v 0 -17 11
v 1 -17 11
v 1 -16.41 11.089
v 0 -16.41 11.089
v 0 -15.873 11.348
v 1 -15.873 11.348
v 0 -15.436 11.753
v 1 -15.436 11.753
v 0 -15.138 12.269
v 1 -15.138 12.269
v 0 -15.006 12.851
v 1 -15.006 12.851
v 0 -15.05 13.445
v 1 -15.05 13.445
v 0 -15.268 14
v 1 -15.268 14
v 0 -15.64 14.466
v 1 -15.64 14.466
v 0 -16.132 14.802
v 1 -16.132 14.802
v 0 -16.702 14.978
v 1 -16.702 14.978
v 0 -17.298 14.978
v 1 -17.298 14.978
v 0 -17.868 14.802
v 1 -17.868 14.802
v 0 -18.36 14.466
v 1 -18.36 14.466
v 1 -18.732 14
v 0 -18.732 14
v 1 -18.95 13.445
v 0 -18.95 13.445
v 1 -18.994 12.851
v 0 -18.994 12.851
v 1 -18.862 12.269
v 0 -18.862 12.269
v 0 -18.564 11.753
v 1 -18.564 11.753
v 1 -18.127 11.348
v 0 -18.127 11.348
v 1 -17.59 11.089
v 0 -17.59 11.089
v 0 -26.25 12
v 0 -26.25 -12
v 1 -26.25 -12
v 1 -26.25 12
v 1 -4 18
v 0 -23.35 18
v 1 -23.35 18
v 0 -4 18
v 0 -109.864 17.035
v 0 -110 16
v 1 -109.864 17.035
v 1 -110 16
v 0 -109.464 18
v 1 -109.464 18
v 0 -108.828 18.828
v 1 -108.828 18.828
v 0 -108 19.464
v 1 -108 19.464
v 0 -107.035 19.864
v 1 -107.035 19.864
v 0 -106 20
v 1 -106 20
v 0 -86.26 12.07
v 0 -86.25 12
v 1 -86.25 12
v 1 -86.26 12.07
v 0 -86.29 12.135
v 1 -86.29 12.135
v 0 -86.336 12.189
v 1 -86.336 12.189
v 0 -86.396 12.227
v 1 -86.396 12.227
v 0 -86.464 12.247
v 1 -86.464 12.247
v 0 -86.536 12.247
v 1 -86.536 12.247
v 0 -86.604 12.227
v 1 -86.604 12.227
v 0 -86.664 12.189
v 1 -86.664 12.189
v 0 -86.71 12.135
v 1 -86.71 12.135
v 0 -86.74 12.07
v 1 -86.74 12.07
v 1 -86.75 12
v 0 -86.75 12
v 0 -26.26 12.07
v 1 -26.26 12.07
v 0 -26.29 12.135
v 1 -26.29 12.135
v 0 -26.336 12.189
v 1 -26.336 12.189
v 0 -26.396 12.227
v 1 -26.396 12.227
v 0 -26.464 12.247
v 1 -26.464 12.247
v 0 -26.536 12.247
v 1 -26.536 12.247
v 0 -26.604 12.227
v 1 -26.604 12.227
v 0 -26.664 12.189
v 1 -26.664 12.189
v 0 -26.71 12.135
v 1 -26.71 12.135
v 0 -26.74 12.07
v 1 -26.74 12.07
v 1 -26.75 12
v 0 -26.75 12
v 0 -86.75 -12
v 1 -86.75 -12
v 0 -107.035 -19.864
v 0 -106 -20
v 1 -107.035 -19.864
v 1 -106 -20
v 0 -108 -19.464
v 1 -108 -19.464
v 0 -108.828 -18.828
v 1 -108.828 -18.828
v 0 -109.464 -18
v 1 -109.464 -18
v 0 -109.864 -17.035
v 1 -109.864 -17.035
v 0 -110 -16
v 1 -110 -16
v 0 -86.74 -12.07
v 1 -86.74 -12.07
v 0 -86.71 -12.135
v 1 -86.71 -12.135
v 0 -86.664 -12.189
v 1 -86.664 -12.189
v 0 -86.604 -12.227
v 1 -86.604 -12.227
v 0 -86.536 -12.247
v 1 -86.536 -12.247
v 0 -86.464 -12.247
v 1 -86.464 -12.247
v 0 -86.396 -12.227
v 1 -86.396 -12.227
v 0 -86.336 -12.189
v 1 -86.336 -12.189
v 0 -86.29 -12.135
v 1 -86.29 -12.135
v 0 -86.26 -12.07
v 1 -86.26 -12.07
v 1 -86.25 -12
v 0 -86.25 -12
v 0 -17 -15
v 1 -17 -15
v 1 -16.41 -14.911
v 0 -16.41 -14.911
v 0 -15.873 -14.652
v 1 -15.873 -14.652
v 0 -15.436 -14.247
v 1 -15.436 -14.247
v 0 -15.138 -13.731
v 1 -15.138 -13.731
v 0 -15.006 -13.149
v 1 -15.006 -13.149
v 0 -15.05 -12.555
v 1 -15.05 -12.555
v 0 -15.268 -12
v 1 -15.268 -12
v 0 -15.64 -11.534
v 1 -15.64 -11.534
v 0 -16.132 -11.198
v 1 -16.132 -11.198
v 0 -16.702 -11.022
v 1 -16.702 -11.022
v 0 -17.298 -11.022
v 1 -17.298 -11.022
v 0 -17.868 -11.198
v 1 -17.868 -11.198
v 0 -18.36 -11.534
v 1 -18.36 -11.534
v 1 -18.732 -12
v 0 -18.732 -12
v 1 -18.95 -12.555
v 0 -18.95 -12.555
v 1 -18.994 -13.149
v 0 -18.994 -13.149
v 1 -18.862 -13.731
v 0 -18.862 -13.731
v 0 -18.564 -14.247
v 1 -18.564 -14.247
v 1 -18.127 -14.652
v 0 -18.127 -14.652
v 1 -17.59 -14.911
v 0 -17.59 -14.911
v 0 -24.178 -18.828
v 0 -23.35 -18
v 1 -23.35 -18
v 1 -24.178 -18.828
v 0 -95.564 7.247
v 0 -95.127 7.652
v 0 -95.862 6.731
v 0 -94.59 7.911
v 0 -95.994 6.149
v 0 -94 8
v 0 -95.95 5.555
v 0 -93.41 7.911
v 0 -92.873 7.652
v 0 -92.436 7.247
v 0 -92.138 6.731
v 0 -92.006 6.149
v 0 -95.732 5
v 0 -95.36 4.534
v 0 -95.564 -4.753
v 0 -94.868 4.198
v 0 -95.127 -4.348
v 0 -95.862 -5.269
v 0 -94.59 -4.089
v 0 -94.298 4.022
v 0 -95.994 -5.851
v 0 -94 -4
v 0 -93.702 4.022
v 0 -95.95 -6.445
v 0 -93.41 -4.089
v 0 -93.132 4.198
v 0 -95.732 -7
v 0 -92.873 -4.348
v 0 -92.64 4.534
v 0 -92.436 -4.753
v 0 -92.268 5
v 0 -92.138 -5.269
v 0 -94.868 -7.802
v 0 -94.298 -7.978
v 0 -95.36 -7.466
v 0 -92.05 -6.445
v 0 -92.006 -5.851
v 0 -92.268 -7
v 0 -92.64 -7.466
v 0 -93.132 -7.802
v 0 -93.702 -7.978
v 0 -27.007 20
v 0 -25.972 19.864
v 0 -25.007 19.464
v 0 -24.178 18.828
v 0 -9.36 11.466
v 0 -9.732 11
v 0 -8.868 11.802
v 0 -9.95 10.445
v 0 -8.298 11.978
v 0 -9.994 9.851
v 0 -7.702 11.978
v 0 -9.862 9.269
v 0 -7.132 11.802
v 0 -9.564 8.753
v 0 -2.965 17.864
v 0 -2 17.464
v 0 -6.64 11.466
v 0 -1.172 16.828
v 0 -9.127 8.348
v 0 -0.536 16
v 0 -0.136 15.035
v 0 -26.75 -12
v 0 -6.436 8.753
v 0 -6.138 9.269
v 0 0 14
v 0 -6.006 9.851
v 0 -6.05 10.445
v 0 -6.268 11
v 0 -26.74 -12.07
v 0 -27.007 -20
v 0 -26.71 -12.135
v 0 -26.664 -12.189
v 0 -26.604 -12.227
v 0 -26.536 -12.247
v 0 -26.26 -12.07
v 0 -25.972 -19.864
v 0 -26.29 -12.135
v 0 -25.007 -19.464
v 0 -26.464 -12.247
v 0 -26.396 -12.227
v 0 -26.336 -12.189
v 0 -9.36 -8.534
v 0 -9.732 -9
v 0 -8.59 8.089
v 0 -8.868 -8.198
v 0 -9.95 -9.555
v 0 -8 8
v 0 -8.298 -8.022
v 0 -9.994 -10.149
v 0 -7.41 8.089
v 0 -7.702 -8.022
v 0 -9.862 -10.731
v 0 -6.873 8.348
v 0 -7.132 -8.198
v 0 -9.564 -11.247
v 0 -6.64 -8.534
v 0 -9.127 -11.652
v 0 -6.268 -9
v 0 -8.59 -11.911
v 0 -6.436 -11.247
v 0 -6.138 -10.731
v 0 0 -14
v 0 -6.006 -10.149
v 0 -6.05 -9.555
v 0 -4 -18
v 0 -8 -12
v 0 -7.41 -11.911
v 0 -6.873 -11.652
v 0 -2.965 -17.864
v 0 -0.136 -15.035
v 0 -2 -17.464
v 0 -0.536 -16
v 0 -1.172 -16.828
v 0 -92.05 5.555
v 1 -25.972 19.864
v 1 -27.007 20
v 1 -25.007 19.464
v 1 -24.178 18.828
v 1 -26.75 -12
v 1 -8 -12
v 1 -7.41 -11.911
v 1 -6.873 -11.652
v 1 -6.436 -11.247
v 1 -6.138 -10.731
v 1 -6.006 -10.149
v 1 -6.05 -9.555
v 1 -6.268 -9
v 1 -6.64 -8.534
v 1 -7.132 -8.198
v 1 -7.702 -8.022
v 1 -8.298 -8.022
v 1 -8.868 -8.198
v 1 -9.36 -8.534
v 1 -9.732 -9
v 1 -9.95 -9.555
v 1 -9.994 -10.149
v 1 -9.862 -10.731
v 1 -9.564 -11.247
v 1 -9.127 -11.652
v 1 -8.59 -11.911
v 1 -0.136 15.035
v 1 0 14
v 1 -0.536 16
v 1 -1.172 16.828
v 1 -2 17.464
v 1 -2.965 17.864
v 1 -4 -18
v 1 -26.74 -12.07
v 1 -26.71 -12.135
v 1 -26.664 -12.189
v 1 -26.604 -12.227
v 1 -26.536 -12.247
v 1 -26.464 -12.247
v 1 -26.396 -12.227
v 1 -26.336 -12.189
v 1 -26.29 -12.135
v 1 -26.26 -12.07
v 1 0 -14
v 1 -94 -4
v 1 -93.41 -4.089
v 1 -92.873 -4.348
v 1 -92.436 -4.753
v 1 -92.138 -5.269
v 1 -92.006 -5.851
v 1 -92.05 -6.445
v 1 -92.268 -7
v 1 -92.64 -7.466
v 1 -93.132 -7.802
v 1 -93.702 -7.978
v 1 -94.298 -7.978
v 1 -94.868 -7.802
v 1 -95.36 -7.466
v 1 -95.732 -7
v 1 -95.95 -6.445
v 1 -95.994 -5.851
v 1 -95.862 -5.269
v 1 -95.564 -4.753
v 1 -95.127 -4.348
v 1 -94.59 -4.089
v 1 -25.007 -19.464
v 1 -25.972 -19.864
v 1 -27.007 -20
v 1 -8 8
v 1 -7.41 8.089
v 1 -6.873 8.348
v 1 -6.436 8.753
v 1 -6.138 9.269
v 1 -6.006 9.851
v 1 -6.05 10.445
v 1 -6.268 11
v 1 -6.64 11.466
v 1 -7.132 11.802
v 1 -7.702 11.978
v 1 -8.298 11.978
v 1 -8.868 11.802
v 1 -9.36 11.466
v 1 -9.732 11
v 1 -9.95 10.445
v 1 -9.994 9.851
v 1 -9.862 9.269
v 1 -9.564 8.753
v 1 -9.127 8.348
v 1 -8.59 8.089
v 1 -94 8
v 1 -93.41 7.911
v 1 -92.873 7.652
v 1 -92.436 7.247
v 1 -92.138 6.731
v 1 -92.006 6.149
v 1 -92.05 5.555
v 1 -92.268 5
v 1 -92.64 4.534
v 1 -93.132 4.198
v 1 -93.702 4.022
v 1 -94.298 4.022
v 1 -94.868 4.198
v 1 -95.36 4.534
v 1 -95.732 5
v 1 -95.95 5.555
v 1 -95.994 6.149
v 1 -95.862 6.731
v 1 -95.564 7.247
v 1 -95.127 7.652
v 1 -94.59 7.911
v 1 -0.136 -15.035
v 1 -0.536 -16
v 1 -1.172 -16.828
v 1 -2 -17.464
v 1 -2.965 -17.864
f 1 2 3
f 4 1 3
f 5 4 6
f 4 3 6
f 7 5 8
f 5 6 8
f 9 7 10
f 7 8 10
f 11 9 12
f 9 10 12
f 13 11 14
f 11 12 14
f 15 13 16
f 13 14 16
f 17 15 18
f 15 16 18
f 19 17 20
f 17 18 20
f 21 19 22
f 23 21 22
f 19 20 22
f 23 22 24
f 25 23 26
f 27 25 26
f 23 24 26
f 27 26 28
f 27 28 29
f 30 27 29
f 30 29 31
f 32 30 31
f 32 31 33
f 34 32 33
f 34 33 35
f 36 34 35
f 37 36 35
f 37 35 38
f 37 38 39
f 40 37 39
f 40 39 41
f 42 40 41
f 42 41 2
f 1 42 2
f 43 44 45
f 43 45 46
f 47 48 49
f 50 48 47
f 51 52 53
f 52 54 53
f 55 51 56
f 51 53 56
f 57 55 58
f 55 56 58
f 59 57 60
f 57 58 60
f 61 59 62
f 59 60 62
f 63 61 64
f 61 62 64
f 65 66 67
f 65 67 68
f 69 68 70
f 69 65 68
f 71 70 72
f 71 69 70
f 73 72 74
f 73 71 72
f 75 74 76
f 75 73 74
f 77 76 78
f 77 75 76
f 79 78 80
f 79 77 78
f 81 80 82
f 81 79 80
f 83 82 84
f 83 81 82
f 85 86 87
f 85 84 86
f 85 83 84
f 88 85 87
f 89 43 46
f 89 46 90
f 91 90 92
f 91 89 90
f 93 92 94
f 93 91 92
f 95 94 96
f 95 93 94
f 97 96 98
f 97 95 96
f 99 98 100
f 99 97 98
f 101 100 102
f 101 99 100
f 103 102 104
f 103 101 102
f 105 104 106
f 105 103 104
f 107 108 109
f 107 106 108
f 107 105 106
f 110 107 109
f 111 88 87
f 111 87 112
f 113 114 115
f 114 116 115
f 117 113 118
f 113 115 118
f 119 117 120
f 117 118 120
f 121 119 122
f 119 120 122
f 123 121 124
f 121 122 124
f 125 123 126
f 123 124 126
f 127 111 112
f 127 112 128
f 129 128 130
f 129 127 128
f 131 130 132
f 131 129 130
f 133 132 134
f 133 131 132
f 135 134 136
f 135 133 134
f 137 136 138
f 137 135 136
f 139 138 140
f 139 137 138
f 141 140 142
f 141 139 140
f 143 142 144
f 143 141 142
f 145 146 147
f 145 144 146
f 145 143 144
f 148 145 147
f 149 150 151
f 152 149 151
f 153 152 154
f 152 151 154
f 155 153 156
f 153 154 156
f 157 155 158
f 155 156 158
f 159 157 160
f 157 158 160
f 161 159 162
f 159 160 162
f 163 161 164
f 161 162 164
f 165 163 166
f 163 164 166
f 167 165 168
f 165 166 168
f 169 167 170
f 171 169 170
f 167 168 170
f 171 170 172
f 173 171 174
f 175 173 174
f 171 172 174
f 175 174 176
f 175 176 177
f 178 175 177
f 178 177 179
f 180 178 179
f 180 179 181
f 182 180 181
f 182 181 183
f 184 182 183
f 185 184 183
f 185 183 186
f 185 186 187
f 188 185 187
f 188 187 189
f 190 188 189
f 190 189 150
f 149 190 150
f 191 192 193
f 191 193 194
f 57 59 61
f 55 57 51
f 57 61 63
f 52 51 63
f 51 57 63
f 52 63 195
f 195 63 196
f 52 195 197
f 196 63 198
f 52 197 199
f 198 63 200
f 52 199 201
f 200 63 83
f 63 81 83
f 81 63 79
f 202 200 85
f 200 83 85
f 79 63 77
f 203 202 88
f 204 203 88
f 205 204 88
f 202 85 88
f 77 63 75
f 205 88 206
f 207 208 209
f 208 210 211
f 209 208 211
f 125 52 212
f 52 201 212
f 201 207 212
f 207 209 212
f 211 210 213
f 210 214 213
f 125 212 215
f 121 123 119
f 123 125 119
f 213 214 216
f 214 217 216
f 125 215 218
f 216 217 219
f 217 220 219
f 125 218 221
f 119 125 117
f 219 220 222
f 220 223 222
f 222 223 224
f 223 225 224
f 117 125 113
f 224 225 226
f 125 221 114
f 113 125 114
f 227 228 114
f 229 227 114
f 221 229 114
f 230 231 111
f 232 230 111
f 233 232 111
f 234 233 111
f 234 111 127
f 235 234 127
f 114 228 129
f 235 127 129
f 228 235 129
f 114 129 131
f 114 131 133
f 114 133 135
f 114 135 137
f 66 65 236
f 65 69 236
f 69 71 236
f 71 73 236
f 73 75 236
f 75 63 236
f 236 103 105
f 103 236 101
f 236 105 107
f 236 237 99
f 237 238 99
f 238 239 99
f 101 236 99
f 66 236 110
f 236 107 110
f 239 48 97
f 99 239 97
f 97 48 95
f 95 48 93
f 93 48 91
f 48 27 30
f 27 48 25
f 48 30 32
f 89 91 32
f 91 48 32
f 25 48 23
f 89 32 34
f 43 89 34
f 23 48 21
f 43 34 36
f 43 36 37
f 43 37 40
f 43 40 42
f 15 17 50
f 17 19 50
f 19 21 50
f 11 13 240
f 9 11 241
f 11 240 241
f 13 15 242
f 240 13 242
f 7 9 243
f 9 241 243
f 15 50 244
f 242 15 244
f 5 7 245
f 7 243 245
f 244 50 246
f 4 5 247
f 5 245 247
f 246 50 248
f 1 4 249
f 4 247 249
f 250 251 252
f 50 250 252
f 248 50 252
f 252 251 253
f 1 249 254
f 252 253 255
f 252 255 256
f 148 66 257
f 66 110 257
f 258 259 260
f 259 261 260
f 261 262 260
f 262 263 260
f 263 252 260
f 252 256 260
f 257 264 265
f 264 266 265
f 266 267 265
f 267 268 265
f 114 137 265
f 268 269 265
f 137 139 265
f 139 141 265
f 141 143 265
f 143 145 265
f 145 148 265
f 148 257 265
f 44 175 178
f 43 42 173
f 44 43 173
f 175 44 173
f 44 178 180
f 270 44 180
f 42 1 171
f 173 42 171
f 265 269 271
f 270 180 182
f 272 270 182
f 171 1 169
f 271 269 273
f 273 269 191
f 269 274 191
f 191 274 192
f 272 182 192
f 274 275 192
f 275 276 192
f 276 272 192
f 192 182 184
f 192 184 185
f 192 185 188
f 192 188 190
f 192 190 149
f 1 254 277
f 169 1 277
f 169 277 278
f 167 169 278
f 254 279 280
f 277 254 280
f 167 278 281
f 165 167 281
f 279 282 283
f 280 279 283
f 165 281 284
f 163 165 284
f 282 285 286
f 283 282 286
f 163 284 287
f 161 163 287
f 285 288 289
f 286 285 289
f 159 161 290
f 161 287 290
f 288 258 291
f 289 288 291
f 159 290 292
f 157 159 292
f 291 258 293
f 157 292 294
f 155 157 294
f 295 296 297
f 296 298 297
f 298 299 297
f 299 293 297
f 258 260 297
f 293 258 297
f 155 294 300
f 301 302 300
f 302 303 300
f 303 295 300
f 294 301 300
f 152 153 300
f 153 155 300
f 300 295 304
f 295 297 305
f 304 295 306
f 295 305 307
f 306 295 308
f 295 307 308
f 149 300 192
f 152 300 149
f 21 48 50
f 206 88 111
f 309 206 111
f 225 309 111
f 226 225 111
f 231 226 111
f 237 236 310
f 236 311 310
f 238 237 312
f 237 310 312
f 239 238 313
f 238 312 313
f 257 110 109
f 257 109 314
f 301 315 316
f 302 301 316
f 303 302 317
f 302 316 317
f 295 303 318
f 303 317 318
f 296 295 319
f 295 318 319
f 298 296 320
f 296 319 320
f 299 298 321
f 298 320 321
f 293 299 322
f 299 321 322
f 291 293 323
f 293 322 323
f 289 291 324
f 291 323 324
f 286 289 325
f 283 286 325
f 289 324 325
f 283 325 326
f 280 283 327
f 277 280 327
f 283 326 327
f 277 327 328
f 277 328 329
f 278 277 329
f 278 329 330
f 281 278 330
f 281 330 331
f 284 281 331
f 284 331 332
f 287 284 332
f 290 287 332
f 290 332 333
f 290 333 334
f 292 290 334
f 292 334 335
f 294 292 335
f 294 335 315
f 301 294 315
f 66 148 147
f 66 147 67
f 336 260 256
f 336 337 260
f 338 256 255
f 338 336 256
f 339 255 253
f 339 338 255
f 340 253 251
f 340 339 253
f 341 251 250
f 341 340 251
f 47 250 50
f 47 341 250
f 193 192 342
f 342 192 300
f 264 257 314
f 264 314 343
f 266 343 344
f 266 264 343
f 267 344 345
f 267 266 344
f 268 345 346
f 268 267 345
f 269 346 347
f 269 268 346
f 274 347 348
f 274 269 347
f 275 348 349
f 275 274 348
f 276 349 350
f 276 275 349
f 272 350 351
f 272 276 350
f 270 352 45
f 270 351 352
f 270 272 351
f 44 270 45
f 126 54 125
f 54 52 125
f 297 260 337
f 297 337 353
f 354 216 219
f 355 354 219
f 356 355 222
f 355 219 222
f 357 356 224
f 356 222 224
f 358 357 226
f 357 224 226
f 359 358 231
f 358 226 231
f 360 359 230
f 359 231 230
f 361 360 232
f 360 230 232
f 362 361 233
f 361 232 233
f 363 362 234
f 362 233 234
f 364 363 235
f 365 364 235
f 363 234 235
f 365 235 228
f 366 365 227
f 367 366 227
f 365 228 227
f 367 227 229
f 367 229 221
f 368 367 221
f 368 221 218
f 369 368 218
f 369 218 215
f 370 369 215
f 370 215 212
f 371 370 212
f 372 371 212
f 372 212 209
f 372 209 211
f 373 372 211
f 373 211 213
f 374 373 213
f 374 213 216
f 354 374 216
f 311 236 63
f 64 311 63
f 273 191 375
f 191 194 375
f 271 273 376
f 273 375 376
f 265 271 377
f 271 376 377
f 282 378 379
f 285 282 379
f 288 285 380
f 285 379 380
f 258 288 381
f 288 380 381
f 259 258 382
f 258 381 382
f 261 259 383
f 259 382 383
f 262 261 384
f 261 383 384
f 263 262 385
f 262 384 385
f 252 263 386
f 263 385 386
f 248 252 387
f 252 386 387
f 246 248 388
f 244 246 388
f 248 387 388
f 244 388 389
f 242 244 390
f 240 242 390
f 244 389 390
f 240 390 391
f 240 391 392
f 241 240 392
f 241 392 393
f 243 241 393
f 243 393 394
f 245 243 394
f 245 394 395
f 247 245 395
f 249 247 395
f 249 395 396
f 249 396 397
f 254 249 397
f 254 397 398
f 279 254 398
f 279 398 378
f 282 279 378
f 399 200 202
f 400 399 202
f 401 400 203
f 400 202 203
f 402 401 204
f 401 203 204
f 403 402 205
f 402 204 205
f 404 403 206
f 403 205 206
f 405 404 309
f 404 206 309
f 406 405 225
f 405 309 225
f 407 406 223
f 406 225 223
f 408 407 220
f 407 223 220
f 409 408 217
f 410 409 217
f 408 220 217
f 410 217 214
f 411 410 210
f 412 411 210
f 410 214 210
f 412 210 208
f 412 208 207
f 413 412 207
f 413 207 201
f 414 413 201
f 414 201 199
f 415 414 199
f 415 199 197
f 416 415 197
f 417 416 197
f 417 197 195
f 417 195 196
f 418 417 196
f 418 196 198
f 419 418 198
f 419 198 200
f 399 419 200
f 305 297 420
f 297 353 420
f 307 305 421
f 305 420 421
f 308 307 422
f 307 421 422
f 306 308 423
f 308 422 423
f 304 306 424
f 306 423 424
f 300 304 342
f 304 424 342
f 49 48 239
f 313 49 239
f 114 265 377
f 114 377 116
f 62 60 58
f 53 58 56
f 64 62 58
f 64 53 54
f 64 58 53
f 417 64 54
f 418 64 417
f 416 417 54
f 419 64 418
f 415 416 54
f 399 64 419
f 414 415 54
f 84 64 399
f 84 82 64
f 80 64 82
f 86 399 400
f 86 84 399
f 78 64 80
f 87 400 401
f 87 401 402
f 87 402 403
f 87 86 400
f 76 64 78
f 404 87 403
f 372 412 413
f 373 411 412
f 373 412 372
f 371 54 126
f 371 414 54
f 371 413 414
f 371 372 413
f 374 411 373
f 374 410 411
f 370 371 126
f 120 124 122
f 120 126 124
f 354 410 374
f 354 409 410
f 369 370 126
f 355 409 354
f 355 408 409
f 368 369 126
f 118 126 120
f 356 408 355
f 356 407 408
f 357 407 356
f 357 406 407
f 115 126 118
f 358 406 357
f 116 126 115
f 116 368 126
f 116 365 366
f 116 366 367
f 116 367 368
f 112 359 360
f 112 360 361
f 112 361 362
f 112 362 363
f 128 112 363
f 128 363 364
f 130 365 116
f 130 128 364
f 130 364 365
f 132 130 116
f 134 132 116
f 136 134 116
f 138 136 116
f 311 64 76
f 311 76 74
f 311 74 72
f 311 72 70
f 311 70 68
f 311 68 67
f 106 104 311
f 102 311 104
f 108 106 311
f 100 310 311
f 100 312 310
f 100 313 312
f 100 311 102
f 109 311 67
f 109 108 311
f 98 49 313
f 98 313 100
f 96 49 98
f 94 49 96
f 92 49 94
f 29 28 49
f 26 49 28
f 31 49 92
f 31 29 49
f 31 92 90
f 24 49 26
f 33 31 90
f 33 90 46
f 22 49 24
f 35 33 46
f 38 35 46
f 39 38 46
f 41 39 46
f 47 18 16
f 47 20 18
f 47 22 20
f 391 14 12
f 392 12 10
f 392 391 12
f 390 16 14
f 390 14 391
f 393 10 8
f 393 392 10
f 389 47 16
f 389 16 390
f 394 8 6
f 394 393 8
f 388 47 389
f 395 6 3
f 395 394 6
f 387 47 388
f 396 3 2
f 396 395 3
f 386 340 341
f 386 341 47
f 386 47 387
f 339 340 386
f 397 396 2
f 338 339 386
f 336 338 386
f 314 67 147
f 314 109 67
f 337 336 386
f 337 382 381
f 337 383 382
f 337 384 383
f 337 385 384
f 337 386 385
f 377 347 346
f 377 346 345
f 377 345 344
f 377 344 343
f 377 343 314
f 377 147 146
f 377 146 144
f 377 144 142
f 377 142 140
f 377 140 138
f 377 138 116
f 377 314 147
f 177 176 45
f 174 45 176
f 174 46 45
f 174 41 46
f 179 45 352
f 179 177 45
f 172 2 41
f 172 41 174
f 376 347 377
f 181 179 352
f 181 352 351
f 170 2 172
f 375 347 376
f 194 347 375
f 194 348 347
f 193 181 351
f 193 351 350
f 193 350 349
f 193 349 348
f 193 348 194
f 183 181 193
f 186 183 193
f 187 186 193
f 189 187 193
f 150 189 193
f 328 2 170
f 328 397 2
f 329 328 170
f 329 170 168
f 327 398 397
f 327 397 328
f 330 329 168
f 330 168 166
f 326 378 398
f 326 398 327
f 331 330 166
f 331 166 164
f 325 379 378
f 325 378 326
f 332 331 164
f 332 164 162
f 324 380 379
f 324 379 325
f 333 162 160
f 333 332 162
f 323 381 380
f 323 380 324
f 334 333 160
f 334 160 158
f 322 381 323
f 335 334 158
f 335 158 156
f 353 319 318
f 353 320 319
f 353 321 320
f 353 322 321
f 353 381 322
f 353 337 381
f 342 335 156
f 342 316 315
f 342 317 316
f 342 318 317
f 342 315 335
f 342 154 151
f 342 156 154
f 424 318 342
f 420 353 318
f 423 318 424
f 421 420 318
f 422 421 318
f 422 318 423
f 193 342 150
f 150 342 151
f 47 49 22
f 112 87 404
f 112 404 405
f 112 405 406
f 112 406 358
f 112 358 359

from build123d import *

# Parameters (mm, degrees)
SKETCH1_W                = 36
SKETCH1_H                = 110
BOSS_EXTRUDE1_DEPTH      = 1
F_4_0_4_DIAMETER_HOLE2_D = 4
F_4_0_4_DIAMETER_HOLE3_D = 4
F_4_0_4_DIAMETER_HOLE1_D = 4
BOSS_EXTRUDE2_DEPTH      = 1
FILLET1_R                = 4
CUT_EXTRUDE1_DEPTH       = 112.807870922
FILLET2_R                = 4


with BuildPart() as part:
    # Sketch1 → Boss-Extrude1 (new body)
    with BuildSketch(Plane(origin=(0, 0, 0), x_dir=(0, 0, -1), z_dir=(1, 0, 0))):
        with Locations((0, -55)):
            Rectangle(SKETCH1_W, SKETCH1_H)
    extrude(amount=BOSS_EXTRUDE1_DEPTH)

    # Ø4.0 (4) Diameter Hole2 (through all)
    with Locations(Plane.ZY):
        with Locations((-10, -8), (10, -8)):
            Hole(F_4_0_4_DIAMETER_HOLE2_D / 2)

    # Ø4.0 (4) Diameter Hole3 (through all)
    with Locations(Plane.ZY):
        with Locations((-13, -17), (13, -17)):
            Hole(F_4_0_4_DIAMETER_HOLE3_D / 2)

    # Ø4.0 (4) Diameter Hole1 (through all)
    with Locations(Plane(origin=(1, 0, 0), x_dir=(0, 0, -1), z_dir=(1, 0, 0))):
        with Locations((6, -94), (-6, -94)):
            Hole(F_4_0_4_DIAMETER_HOLE1_D / 2)

    # Sketch9 → Boss-Extrude2 (add)
    with BuildSketch(Plane.ZY):
        Polygon((18, -23.35), (20, -25.35), (20, -110), (18, -110), align=None)
        Polygon((-18, -23.35), (-20, -25.35), (-20, -110), (-18, -110), align=None)
    extrude(amount=-BOSS_EXTRUDE2_DEPTH)

    # Fillet1
    fillet1_edges = [part.edges().sort_by_distance(p)[0] for p in [
        (0.5, 0, 18),
        (0.5, 0, -18),
    ]]
    fillet(fillet1_edges, radius=FILLET1_R)

    # Sketch10 → Cut-Extrude1 (cut, through all)
    with BuildSketch(Plane.ZY):
        with BuildLine():
            Line((12, -86.75), (-12, -86.75))
            ThreePointArc((-12, -86.75), (-12.25, -86.5), (-12, -86.25))
            Line((-12, -86.25), (12, -86.25))
            ThreePointArc((12, -86.25), (12.25, -86.5), (12, -86.75))
        make_face()
        with BuildLine():
            Line((12, -26.75), (-12, -26.75))
            ThreePointArc((-12, -26.75), (-12.25, -26.5), (-12, -26.25))
            Line((-12, -26.25), (12, -26.25))
            ThreePointArc((12, -26.25), (12.25, -26.5), (12, -26.75))
        make_face()
    extrude(amount=-CUT_EXTRUDE1_DEPTH, mode=Mode.SUBTRACT)

    # Fillet2
    fillet2_edges = [part.edges().sort_by_distance(p)[0] for p in [
        (0.5, -25.35, 20),
        (0.5, -110, 20),
        (0.5, -110, -20),
        (0.5, -25.35, -20),
    ]]
    fillet(fillet2_edges, radius=FILLET2_R)


solid = part.part
